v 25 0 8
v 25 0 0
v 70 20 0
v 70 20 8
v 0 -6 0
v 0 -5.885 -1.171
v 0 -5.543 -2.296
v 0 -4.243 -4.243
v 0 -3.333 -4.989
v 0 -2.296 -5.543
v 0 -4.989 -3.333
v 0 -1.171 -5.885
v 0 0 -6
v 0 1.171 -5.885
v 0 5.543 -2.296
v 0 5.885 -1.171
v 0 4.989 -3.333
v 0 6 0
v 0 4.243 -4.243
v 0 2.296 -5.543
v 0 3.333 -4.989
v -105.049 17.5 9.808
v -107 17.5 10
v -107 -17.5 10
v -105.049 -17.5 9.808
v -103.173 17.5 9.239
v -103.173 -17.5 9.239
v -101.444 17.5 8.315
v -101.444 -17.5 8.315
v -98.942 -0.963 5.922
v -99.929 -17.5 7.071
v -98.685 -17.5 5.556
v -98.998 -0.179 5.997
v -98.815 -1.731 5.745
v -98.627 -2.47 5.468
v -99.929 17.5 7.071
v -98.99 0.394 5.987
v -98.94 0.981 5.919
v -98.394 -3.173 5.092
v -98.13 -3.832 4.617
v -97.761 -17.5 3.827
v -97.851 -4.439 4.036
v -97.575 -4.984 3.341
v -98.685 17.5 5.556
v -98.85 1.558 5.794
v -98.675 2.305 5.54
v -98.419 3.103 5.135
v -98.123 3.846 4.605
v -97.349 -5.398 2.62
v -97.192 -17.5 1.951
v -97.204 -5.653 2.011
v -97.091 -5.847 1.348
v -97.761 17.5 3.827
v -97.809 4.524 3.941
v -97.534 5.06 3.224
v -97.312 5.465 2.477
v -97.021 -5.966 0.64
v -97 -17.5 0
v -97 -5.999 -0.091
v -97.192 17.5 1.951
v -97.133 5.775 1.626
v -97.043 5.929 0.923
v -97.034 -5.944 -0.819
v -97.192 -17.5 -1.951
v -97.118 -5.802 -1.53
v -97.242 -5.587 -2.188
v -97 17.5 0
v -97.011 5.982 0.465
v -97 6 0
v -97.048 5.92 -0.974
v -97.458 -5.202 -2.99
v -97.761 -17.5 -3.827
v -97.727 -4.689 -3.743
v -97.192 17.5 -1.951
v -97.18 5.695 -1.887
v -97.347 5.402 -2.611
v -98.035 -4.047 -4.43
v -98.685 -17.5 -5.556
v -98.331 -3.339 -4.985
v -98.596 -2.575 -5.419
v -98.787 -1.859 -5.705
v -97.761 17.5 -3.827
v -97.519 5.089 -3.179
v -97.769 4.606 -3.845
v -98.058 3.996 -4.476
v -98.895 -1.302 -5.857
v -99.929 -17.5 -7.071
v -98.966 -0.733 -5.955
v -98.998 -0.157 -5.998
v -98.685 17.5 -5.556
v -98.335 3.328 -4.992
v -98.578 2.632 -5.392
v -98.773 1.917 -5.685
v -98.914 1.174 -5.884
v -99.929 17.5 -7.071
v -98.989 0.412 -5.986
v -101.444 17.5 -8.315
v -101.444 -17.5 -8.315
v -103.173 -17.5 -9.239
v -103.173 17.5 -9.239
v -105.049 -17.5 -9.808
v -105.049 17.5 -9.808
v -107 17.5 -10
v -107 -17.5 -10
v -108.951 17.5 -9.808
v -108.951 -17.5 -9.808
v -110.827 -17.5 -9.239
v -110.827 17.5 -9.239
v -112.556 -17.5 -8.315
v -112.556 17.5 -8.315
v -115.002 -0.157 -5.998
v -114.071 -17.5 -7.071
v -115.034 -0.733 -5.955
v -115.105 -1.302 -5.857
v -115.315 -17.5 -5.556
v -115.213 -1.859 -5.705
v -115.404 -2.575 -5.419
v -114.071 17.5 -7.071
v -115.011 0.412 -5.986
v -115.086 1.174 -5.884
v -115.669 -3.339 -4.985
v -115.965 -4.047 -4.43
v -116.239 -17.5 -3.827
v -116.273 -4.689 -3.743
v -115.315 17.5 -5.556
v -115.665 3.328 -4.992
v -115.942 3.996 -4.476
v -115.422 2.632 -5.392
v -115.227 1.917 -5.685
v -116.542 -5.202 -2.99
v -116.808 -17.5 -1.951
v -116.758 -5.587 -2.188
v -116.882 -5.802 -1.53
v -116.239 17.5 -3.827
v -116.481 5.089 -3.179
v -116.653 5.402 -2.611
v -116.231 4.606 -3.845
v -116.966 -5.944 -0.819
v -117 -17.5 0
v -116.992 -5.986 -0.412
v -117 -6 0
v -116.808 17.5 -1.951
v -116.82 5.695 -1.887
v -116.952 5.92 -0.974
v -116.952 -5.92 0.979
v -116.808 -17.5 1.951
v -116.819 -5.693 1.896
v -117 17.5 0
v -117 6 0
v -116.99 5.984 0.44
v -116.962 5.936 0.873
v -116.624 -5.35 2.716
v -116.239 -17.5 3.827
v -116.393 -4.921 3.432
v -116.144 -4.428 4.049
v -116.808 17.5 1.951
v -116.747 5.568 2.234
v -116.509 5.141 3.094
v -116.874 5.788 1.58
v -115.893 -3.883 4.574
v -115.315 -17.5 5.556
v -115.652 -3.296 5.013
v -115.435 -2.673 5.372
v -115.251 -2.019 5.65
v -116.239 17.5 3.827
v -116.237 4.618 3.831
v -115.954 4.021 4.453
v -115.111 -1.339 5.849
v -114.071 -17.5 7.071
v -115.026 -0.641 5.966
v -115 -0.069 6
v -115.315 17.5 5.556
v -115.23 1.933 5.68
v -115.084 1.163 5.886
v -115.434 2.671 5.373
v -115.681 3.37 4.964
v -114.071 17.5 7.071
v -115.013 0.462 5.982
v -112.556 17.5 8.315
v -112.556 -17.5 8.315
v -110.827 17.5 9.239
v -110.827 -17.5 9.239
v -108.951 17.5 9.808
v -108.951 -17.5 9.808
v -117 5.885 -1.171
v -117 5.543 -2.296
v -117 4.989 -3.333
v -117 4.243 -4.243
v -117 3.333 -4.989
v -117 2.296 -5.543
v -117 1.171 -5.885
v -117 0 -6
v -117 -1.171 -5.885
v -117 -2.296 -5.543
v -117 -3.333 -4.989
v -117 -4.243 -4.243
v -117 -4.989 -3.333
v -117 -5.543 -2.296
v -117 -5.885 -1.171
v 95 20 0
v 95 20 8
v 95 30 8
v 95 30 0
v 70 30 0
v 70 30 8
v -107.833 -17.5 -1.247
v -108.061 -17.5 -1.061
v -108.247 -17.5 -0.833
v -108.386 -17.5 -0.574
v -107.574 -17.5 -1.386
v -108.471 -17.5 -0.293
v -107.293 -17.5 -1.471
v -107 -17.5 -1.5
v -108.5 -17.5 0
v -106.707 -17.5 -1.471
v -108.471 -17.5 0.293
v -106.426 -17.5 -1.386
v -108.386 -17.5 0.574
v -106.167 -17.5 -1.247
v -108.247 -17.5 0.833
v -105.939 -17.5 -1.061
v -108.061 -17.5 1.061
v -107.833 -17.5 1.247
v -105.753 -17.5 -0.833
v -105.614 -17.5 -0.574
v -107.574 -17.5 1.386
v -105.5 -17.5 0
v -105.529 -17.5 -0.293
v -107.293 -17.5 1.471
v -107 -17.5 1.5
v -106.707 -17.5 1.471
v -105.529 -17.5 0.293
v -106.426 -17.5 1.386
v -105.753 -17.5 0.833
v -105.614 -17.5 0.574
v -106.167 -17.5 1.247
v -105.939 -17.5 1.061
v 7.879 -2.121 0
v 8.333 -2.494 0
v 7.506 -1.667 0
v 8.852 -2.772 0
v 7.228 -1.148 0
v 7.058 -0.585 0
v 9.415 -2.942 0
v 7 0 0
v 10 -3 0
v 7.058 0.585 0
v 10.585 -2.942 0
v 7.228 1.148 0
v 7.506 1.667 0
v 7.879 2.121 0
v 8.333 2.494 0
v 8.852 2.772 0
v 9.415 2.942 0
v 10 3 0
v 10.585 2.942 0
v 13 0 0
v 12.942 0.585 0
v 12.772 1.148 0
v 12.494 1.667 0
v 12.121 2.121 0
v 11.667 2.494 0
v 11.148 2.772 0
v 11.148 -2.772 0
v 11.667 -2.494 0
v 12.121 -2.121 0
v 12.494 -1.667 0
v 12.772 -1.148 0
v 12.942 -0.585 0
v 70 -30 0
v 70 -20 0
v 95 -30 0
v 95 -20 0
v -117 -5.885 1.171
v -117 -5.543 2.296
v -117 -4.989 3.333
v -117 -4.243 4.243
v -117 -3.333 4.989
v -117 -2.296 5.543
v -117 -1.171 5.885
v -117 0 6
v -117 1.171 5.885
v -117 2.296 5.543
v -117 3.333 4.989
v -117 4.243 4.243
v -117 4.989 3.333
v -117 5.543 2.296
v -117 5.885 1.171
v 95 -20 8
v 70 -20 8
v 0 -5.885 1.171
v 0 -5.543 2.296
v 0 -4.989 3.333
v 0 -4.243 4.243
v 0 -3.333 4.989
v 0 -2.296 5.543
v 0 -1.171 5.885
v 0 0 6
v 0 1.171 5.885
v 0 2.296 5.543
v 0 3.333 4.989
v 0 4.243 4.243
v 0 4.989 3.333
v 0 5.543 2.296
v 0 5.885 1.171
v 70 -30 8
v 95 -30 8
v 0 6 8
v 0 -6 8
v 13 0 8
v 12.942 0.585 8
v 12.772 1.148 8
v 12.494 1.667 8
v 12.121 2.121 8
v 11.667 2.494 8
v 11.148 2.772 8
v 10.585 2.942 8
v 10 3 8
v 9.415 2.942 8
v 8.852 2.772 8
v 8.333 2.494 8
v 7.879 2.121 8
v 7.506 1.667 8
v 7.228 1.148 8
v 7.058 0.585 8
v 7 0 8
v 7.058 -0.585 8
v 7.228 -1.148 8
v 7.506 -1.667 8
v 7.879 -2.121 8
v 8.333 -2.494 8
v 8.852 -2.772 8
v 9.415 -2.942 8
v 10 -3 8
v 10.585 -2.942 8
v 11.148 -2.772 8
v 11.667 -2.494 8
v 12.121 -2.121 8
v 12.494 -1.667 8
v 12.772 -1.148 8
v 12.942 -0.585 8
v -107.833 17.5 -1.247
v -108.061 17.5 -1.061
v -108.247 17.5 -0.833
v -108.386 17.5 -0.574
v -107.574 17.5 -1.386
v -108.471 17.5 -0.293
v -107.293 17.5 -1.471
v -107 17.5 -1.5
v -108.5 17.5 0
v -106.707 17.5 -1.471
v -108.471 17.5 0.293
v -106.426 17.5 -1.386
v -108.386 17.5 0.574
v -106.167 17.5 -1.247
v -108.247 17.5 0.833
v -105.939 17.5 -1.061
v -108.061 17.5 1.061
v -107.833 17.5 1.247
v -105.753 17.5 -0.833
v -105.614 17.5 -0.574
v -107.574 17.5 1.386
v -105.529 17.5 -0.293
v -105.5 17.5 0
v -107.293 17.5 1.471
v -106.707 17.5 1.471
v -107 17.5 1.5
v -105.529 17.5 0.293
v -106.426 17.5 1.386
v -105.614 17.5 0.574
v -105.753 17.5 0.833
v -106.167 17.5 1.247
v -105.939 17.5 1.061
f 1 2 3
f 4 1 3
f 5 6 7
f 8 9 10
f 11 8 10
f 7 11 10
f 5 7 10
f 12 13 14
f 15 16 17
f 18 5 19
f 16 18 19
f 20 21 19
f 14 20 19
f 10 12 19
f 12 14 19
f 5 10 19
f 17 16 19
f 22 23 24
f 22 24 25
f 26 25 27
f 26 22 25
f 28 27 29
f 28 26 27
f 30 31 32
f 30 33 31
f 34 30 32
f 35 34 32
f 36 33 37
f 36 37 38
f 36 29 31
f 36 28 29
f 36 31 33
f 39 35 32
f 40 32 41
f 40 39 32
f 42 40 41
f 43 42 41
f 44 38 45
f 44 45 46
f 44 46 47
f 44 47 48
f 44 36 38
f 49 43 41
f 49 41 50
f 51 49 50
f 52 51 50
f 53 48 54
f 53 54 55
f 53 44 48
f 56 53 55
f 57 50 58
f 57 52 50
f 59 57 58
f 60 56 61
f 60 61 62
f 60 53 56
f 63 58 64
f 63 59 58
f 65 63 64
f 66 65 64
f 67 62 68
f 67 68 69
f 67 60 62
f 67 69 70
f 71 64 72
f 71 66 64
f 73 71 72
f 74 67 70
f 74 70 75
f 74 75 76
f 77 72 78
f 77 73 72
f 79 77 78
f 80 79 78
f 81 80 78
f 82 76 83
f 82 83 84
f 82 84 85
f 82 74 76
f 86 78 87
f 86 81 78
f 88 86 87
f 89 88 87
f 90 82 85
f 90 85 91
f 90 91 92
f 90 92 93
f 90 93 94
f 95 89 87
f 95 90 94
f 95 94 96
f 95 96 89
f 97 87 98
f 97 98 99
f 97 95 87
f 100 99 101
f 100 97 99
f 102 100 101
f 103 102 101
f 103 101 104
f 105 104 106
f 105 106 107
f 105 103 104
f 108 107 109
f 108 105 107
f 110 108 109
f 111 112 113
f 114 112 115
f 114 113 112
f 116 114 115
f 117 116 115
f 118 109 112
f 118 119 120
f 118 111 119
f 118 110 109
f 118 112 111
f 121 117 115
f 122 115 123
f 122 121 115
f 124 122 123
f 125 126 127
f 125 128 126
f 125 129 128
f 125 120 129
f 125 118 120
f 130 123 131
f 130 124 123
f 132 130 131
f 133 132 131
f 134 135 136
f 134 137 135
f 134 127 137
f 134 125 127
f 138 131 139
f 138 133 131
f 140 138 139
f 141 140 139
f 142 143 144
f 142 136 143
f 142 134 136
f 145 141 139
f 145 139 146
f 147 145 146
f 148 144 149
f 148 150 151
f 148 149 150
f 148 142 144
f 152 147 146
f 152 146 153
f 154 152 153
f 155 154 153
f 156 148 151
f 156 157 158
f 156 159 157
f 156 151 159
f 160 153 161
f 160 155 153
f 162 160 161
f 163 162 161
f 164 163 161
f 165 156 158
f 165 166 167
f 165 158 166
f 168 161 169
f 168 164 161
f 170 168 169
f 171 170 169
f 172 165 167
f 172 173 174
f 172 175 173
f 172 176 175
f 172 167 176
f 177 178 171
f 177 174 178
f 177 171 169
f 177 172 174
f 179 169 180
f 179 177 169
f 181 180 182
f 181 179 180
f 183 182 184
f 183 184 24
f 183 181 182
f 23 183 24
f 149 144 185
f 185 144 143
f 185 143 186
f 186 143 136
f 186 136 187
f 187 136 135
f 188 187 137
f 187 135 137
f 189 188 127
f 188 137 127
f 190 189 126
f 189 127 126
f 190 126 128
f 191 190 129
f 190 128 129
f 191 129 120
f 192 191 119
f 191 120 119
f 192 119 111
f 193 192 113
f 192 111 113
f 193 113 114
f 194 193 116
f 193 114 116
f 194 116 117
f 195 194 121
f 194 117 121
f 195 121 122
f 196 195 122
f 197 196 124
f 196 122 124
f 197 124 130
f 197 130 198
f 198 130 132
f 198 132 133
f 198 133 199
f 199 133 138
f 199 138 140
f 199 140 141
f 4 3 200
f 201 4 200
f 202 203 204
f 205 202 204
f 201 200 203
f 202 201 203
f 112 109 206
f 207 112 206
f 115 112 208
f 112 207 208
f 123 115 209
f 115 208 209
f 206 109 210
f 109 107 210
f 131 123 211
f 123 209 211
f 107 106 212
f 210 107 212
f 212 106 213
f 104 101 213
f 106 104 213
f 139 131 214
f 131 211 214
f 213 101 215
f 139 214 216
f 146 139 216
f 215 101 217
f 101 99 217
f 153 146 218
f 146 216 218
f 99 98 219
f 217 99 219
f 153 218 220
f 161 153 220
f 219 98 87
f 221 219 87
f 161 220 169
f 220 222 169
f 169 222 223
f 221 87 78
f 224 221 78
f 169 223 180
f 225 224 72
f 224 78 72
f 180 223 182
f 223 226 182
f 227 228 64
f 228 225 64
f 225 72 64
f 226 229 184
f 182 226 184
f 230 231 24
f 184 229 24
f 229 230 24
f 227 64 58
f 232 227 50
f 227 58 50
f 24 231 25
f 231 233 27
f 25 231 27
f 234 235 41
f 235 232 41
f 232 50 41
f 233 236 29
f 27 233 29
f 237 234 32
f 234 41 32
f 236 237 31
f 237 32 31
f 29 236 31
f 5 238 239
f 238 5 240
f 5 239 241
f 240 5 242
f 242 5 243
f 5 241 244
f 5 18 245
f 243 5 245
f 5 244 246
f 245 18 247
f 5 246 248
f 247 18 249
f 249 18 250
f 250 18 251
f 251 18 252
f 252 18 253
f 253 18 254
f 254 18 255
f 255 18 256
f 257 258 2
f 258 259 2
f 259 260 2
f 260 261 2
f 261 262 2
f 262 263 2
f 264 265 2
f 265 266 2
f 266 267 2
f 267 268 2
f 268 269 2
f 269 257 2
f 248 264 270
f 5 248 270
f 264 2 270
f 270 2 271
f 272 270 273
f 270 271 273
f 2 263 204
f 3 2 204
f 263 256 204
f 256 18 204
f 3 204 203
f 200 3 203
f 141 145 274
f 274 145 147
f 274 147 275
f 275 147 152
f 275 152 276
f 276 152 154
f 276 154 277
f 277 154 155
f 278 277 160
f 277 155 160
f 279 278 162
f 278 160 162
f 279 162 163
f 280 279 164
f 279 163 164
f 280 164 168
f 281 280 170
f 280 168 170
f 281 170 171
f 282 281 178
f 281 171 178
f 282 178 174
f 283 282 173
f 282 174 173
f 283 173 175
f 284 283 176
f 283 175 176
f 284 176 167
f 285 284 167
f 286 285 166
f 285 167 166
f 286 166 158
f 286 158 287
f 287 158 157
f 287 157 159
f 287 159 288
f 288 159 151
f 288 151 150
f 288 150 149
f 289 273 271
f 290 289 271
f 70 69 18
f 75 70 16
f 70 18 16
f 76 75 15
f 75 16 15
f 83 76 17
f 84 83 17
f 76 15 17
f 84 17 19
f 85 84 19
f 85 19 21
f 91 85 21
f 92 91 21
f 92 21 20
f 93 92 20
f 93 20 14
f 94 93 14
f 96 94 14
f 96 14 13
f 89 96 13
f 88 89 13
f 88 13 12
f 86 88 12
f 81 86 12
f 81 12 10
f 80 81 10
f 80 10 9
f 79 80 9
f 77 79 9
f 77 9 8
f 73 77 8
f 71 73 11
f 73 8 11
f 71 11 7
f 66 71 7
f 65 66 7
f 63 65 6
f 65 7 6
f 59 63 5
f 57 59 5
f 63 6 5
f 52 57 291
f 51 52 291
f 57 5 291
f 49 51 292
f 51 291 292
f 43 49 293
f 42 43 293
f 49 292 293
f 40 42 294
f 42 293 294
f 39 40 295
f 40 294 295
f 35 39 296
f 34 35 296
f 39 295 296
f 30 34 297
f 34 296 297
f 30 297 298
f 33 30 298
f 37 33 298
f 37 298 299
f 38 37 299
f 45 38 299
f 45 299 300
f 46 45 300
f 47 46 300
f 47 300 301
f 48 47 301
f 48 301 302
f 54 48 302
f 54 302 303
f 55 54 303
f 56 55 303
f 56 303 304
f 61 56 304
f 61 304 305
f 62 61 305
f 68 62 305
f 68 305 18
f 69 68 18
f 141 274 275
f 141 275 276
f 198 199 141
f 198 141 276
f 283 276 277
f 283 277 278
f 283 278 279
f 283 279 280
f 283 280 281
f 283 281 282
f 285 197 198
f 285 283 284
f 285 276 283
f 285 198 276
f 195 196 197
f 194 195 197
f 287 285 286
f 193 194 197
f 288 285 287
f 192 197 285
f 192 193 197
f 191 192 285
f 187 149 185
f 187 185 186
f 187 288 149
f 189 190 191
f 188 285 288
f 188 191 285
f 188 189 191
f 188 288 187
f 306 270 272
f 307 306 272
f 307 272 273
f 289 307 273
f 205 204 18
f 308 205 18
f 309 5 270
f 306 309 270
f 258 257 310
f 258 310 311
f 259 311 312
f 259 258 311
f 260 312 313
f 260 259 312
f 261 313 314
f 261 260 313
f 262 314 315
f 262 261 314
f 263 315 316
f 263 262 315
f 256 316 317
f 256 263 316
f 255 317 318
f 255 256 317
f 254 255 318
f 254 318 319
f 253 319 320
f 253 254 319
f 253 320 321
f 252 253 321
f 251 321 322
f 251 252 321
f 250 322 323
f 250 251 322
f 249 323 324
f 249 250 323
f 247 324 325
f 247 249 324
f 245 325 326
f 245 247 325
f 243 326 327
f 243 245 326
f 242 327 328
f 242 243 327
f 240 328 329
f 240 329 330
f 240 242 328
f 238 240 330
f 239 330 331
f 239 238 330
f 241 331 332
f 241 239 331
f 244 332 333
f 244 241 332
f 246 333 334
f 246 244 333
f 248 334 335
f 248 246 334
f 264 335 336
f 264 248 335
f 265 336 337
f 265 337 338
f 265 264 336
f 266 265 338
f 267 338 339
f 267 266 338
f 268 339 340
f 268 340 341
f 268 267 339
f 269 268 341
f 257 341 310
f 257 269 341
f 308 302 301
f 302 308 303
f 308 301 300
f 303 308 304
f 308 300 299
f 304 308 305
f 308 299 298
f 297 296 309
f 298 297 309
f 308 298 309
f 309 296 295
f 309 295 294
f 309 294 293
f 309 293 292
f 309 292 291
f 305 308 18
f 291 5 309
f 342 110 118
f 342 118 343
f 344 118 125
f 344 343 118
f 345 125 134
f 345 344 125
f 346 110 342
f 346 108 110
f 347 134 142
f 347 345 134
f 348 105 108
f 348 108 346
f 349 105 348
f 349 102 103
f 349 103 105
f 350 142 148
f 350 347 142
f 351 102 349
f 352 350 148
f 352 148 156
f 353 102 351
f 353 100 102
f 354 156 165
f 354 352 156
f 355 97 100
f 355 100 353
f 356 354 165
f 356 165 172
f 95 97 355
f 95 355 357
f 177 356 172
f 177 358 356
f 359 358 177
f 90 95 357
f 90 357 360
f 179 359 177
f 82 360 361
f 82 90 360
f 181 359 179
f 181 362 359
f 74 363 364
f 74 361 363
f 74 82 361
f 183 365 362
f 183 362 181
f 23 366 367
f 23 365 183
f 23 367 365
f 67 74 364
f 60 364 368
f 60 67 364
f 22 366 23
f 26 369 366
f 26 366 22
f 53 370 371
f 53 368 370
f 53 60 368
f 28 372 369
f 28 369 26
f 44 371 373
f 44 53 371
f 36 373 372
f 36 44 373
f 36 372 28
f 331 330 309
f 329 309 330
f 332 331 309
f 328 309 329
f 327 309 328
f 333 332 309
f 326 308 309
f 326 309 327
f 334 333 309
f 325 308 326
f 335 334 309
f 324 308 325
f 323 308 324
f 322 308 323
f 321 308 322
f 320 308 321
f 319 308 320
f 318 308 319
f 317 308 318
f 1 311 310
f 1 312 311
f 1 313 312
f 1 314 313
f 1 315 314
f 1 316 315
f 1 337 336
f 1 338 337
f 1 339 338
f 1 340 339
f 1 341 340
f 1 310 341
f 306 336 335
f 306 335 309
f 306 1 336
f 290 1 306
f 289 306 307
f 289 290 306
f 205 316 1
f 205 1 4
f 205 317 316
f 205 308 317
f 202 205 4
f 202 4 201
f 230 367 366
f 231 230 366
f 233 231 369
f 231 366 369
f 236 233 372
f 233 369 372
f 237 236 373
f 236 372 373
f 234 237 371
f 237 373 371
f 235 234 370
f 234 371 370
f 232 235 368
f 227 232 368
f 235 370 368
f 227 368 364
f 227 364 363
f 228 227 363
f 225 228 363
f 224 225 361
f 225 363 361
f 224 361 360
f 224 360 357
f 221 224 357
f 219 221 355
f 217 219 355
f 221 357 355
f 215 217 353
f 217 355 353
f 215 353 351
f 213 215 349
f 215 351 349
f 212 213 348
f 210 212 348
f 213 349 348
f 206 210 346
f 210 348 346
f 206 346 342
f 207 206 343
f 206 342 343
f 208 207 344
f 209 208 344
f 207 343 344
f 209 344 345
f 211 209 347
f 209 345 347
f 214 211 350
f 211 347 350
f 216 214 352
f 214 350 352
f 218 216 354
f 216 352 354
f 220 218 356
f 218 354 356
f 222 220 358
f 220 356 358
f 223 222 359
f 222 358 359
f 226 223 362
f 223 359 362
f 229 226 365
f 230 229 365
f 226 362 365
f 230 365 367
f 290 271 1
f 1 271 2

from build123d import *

# Parameters (mm, degrees)
ESQUISSE1_R             = 3
BASE_EXTRUSION_DEPTH    = 8
ESQUISSE2_R             = 6
BOSS_EXTRU_1_DEPTH      = 117
ESQUISSE3_R             = 10
BOSS_EXTRU_2_DEPTH      = 17.5
ESQUISSE4_R             = 1.5
ENL_V_MAT_EXTRU_1_DEPTH = 35


with BuildPart() as part:
    # Esquisse1 → Base-Extrusion (new body)
    with BuildSketch(Plane.XY):
        Polygon((0, 6), (0, -6), (70, -30), (95, -30), (95, -20), (70, -20), (25, 0), (70, 20), (95, 20), (95, 30), (70, 30), align=None)
        with Locations((10, 0)):
            Circle(ESQUISSE1_R, mode=Mode.SUBTRACT)
    extrude(amount=BASE_EXTRUSION_DEPTH)

    # Esquisse2 → Boss.-Extru.1 (add)
    with BuildSketch(Plane.ZY):
        with Locations(Location((0, 0, 0), (0, 0, 90))):
            Circle(ESQUISSE2_R)
    extrude(amount=BOSS_EXTRU_1_DEPTH)

    # Esquisse3 → Boss.-Extru.2 (add, symmetric)
    with BuildSketch(Plane(origin=(0, 0, 0), x_dir=(1, 0, 0), z_dir=(0, 1, 0))):
        with Locations(Location((-107, 0, 0), (0, 0, 270))):
            Circle(ESQUISSE3_R)
    extrude(amount=BOSS_EXTRU_2_DEPTH, both=True)

    # Esquisse4 → Enlèv. mat.-Extru.1 (cut)
    with BuildSketch(Plane(origin=(0, 17.5, 0), x_dir=(-1, 0, 0), z_dir=(0, 1, 0))):
        with Locations(Location((107, 0, 0), (0, 0, 90))):
            Circle(ESQUISSE4_R)
    extrude(amount=-ENL_V_MAT_EXTRU_1_DEPTH, mode=Mode.SUBTRACT)


solid = part.part
